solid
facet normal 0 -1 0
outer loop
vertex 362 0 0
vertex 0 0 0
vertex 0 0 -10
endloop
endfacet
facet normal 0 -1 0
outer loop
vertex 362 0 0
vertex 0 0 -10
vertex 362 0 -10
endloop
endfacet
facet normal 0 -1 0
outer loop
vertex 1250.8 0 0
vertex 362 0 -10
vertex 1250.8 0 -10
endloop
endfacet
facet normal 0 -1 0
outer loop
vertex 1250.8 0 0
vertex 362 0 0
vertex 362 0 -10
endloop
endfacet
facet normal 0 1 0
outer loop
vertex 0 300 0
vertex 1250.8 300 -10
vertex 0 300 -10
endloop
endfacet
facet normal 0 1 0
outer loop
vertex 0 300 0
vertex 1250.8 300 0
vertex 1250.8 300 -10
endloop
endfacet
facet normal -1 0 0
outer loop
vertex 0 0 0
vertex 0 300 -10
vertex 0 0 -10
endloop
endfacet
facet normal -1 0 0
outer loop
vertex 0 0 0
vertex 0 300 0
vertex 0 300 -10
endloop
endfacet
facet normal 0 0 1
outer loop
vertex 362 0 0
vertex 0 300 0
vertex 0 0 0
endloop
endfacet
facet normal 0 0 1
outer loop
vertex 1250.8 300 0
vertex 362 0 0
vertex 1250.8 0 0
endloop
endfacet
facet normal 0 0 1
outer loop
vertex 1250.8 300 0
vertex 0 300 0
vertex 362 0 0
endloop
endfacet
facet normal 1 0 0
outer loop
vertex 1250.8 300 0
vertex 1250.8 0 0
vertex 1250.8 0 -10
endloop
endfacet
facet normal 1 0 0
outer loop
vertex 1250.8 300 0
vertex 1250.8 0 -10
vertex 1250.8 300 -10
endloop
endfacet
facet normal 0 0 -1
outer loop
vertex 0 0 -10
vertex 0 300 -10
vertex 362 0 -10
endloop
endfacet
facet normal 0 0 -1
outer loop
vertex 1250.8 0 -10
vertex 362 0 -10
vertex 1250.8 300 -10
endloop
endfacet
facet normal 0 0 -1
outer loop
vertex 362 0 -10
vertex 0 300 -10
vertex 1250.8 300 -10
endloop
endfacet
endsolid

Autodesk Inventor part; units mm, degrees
ref_plane "YZ Plane" through (0, 0, 0) normal (1, 0, 0) x (0, 1, 0)
ref_plane "XZ Plane" through (0, 0, 0) normal (0, 1, 0) x (-1, 0, 0)
ref_plane "XY Plane" through (0, 0, 0) normal (0, 0, 1) x (1, 0, 0)
sketch "Sketch1" plane through (0, 0, 0) normal (0, 0, 1) x (1, 0, 0)
  line L0 (1250.8, 0) -> (1250.8, 300)
  line L1 (1250.8, 300) -> (0, 300)
  line L2 (0, 300) -> (0, 0)
  line L3 (0, 0) -> (362, 0)
  line L4 (0, 0) -> (1250.8, 0)
  dimension "d0" = 1250.8
  dimension "d1" = 300
extrude "Extrusion1" add sketch "Sketch1" against normal blind 10
properties part number "Acrilico2_Prensa" material "PMMA Plastic"
